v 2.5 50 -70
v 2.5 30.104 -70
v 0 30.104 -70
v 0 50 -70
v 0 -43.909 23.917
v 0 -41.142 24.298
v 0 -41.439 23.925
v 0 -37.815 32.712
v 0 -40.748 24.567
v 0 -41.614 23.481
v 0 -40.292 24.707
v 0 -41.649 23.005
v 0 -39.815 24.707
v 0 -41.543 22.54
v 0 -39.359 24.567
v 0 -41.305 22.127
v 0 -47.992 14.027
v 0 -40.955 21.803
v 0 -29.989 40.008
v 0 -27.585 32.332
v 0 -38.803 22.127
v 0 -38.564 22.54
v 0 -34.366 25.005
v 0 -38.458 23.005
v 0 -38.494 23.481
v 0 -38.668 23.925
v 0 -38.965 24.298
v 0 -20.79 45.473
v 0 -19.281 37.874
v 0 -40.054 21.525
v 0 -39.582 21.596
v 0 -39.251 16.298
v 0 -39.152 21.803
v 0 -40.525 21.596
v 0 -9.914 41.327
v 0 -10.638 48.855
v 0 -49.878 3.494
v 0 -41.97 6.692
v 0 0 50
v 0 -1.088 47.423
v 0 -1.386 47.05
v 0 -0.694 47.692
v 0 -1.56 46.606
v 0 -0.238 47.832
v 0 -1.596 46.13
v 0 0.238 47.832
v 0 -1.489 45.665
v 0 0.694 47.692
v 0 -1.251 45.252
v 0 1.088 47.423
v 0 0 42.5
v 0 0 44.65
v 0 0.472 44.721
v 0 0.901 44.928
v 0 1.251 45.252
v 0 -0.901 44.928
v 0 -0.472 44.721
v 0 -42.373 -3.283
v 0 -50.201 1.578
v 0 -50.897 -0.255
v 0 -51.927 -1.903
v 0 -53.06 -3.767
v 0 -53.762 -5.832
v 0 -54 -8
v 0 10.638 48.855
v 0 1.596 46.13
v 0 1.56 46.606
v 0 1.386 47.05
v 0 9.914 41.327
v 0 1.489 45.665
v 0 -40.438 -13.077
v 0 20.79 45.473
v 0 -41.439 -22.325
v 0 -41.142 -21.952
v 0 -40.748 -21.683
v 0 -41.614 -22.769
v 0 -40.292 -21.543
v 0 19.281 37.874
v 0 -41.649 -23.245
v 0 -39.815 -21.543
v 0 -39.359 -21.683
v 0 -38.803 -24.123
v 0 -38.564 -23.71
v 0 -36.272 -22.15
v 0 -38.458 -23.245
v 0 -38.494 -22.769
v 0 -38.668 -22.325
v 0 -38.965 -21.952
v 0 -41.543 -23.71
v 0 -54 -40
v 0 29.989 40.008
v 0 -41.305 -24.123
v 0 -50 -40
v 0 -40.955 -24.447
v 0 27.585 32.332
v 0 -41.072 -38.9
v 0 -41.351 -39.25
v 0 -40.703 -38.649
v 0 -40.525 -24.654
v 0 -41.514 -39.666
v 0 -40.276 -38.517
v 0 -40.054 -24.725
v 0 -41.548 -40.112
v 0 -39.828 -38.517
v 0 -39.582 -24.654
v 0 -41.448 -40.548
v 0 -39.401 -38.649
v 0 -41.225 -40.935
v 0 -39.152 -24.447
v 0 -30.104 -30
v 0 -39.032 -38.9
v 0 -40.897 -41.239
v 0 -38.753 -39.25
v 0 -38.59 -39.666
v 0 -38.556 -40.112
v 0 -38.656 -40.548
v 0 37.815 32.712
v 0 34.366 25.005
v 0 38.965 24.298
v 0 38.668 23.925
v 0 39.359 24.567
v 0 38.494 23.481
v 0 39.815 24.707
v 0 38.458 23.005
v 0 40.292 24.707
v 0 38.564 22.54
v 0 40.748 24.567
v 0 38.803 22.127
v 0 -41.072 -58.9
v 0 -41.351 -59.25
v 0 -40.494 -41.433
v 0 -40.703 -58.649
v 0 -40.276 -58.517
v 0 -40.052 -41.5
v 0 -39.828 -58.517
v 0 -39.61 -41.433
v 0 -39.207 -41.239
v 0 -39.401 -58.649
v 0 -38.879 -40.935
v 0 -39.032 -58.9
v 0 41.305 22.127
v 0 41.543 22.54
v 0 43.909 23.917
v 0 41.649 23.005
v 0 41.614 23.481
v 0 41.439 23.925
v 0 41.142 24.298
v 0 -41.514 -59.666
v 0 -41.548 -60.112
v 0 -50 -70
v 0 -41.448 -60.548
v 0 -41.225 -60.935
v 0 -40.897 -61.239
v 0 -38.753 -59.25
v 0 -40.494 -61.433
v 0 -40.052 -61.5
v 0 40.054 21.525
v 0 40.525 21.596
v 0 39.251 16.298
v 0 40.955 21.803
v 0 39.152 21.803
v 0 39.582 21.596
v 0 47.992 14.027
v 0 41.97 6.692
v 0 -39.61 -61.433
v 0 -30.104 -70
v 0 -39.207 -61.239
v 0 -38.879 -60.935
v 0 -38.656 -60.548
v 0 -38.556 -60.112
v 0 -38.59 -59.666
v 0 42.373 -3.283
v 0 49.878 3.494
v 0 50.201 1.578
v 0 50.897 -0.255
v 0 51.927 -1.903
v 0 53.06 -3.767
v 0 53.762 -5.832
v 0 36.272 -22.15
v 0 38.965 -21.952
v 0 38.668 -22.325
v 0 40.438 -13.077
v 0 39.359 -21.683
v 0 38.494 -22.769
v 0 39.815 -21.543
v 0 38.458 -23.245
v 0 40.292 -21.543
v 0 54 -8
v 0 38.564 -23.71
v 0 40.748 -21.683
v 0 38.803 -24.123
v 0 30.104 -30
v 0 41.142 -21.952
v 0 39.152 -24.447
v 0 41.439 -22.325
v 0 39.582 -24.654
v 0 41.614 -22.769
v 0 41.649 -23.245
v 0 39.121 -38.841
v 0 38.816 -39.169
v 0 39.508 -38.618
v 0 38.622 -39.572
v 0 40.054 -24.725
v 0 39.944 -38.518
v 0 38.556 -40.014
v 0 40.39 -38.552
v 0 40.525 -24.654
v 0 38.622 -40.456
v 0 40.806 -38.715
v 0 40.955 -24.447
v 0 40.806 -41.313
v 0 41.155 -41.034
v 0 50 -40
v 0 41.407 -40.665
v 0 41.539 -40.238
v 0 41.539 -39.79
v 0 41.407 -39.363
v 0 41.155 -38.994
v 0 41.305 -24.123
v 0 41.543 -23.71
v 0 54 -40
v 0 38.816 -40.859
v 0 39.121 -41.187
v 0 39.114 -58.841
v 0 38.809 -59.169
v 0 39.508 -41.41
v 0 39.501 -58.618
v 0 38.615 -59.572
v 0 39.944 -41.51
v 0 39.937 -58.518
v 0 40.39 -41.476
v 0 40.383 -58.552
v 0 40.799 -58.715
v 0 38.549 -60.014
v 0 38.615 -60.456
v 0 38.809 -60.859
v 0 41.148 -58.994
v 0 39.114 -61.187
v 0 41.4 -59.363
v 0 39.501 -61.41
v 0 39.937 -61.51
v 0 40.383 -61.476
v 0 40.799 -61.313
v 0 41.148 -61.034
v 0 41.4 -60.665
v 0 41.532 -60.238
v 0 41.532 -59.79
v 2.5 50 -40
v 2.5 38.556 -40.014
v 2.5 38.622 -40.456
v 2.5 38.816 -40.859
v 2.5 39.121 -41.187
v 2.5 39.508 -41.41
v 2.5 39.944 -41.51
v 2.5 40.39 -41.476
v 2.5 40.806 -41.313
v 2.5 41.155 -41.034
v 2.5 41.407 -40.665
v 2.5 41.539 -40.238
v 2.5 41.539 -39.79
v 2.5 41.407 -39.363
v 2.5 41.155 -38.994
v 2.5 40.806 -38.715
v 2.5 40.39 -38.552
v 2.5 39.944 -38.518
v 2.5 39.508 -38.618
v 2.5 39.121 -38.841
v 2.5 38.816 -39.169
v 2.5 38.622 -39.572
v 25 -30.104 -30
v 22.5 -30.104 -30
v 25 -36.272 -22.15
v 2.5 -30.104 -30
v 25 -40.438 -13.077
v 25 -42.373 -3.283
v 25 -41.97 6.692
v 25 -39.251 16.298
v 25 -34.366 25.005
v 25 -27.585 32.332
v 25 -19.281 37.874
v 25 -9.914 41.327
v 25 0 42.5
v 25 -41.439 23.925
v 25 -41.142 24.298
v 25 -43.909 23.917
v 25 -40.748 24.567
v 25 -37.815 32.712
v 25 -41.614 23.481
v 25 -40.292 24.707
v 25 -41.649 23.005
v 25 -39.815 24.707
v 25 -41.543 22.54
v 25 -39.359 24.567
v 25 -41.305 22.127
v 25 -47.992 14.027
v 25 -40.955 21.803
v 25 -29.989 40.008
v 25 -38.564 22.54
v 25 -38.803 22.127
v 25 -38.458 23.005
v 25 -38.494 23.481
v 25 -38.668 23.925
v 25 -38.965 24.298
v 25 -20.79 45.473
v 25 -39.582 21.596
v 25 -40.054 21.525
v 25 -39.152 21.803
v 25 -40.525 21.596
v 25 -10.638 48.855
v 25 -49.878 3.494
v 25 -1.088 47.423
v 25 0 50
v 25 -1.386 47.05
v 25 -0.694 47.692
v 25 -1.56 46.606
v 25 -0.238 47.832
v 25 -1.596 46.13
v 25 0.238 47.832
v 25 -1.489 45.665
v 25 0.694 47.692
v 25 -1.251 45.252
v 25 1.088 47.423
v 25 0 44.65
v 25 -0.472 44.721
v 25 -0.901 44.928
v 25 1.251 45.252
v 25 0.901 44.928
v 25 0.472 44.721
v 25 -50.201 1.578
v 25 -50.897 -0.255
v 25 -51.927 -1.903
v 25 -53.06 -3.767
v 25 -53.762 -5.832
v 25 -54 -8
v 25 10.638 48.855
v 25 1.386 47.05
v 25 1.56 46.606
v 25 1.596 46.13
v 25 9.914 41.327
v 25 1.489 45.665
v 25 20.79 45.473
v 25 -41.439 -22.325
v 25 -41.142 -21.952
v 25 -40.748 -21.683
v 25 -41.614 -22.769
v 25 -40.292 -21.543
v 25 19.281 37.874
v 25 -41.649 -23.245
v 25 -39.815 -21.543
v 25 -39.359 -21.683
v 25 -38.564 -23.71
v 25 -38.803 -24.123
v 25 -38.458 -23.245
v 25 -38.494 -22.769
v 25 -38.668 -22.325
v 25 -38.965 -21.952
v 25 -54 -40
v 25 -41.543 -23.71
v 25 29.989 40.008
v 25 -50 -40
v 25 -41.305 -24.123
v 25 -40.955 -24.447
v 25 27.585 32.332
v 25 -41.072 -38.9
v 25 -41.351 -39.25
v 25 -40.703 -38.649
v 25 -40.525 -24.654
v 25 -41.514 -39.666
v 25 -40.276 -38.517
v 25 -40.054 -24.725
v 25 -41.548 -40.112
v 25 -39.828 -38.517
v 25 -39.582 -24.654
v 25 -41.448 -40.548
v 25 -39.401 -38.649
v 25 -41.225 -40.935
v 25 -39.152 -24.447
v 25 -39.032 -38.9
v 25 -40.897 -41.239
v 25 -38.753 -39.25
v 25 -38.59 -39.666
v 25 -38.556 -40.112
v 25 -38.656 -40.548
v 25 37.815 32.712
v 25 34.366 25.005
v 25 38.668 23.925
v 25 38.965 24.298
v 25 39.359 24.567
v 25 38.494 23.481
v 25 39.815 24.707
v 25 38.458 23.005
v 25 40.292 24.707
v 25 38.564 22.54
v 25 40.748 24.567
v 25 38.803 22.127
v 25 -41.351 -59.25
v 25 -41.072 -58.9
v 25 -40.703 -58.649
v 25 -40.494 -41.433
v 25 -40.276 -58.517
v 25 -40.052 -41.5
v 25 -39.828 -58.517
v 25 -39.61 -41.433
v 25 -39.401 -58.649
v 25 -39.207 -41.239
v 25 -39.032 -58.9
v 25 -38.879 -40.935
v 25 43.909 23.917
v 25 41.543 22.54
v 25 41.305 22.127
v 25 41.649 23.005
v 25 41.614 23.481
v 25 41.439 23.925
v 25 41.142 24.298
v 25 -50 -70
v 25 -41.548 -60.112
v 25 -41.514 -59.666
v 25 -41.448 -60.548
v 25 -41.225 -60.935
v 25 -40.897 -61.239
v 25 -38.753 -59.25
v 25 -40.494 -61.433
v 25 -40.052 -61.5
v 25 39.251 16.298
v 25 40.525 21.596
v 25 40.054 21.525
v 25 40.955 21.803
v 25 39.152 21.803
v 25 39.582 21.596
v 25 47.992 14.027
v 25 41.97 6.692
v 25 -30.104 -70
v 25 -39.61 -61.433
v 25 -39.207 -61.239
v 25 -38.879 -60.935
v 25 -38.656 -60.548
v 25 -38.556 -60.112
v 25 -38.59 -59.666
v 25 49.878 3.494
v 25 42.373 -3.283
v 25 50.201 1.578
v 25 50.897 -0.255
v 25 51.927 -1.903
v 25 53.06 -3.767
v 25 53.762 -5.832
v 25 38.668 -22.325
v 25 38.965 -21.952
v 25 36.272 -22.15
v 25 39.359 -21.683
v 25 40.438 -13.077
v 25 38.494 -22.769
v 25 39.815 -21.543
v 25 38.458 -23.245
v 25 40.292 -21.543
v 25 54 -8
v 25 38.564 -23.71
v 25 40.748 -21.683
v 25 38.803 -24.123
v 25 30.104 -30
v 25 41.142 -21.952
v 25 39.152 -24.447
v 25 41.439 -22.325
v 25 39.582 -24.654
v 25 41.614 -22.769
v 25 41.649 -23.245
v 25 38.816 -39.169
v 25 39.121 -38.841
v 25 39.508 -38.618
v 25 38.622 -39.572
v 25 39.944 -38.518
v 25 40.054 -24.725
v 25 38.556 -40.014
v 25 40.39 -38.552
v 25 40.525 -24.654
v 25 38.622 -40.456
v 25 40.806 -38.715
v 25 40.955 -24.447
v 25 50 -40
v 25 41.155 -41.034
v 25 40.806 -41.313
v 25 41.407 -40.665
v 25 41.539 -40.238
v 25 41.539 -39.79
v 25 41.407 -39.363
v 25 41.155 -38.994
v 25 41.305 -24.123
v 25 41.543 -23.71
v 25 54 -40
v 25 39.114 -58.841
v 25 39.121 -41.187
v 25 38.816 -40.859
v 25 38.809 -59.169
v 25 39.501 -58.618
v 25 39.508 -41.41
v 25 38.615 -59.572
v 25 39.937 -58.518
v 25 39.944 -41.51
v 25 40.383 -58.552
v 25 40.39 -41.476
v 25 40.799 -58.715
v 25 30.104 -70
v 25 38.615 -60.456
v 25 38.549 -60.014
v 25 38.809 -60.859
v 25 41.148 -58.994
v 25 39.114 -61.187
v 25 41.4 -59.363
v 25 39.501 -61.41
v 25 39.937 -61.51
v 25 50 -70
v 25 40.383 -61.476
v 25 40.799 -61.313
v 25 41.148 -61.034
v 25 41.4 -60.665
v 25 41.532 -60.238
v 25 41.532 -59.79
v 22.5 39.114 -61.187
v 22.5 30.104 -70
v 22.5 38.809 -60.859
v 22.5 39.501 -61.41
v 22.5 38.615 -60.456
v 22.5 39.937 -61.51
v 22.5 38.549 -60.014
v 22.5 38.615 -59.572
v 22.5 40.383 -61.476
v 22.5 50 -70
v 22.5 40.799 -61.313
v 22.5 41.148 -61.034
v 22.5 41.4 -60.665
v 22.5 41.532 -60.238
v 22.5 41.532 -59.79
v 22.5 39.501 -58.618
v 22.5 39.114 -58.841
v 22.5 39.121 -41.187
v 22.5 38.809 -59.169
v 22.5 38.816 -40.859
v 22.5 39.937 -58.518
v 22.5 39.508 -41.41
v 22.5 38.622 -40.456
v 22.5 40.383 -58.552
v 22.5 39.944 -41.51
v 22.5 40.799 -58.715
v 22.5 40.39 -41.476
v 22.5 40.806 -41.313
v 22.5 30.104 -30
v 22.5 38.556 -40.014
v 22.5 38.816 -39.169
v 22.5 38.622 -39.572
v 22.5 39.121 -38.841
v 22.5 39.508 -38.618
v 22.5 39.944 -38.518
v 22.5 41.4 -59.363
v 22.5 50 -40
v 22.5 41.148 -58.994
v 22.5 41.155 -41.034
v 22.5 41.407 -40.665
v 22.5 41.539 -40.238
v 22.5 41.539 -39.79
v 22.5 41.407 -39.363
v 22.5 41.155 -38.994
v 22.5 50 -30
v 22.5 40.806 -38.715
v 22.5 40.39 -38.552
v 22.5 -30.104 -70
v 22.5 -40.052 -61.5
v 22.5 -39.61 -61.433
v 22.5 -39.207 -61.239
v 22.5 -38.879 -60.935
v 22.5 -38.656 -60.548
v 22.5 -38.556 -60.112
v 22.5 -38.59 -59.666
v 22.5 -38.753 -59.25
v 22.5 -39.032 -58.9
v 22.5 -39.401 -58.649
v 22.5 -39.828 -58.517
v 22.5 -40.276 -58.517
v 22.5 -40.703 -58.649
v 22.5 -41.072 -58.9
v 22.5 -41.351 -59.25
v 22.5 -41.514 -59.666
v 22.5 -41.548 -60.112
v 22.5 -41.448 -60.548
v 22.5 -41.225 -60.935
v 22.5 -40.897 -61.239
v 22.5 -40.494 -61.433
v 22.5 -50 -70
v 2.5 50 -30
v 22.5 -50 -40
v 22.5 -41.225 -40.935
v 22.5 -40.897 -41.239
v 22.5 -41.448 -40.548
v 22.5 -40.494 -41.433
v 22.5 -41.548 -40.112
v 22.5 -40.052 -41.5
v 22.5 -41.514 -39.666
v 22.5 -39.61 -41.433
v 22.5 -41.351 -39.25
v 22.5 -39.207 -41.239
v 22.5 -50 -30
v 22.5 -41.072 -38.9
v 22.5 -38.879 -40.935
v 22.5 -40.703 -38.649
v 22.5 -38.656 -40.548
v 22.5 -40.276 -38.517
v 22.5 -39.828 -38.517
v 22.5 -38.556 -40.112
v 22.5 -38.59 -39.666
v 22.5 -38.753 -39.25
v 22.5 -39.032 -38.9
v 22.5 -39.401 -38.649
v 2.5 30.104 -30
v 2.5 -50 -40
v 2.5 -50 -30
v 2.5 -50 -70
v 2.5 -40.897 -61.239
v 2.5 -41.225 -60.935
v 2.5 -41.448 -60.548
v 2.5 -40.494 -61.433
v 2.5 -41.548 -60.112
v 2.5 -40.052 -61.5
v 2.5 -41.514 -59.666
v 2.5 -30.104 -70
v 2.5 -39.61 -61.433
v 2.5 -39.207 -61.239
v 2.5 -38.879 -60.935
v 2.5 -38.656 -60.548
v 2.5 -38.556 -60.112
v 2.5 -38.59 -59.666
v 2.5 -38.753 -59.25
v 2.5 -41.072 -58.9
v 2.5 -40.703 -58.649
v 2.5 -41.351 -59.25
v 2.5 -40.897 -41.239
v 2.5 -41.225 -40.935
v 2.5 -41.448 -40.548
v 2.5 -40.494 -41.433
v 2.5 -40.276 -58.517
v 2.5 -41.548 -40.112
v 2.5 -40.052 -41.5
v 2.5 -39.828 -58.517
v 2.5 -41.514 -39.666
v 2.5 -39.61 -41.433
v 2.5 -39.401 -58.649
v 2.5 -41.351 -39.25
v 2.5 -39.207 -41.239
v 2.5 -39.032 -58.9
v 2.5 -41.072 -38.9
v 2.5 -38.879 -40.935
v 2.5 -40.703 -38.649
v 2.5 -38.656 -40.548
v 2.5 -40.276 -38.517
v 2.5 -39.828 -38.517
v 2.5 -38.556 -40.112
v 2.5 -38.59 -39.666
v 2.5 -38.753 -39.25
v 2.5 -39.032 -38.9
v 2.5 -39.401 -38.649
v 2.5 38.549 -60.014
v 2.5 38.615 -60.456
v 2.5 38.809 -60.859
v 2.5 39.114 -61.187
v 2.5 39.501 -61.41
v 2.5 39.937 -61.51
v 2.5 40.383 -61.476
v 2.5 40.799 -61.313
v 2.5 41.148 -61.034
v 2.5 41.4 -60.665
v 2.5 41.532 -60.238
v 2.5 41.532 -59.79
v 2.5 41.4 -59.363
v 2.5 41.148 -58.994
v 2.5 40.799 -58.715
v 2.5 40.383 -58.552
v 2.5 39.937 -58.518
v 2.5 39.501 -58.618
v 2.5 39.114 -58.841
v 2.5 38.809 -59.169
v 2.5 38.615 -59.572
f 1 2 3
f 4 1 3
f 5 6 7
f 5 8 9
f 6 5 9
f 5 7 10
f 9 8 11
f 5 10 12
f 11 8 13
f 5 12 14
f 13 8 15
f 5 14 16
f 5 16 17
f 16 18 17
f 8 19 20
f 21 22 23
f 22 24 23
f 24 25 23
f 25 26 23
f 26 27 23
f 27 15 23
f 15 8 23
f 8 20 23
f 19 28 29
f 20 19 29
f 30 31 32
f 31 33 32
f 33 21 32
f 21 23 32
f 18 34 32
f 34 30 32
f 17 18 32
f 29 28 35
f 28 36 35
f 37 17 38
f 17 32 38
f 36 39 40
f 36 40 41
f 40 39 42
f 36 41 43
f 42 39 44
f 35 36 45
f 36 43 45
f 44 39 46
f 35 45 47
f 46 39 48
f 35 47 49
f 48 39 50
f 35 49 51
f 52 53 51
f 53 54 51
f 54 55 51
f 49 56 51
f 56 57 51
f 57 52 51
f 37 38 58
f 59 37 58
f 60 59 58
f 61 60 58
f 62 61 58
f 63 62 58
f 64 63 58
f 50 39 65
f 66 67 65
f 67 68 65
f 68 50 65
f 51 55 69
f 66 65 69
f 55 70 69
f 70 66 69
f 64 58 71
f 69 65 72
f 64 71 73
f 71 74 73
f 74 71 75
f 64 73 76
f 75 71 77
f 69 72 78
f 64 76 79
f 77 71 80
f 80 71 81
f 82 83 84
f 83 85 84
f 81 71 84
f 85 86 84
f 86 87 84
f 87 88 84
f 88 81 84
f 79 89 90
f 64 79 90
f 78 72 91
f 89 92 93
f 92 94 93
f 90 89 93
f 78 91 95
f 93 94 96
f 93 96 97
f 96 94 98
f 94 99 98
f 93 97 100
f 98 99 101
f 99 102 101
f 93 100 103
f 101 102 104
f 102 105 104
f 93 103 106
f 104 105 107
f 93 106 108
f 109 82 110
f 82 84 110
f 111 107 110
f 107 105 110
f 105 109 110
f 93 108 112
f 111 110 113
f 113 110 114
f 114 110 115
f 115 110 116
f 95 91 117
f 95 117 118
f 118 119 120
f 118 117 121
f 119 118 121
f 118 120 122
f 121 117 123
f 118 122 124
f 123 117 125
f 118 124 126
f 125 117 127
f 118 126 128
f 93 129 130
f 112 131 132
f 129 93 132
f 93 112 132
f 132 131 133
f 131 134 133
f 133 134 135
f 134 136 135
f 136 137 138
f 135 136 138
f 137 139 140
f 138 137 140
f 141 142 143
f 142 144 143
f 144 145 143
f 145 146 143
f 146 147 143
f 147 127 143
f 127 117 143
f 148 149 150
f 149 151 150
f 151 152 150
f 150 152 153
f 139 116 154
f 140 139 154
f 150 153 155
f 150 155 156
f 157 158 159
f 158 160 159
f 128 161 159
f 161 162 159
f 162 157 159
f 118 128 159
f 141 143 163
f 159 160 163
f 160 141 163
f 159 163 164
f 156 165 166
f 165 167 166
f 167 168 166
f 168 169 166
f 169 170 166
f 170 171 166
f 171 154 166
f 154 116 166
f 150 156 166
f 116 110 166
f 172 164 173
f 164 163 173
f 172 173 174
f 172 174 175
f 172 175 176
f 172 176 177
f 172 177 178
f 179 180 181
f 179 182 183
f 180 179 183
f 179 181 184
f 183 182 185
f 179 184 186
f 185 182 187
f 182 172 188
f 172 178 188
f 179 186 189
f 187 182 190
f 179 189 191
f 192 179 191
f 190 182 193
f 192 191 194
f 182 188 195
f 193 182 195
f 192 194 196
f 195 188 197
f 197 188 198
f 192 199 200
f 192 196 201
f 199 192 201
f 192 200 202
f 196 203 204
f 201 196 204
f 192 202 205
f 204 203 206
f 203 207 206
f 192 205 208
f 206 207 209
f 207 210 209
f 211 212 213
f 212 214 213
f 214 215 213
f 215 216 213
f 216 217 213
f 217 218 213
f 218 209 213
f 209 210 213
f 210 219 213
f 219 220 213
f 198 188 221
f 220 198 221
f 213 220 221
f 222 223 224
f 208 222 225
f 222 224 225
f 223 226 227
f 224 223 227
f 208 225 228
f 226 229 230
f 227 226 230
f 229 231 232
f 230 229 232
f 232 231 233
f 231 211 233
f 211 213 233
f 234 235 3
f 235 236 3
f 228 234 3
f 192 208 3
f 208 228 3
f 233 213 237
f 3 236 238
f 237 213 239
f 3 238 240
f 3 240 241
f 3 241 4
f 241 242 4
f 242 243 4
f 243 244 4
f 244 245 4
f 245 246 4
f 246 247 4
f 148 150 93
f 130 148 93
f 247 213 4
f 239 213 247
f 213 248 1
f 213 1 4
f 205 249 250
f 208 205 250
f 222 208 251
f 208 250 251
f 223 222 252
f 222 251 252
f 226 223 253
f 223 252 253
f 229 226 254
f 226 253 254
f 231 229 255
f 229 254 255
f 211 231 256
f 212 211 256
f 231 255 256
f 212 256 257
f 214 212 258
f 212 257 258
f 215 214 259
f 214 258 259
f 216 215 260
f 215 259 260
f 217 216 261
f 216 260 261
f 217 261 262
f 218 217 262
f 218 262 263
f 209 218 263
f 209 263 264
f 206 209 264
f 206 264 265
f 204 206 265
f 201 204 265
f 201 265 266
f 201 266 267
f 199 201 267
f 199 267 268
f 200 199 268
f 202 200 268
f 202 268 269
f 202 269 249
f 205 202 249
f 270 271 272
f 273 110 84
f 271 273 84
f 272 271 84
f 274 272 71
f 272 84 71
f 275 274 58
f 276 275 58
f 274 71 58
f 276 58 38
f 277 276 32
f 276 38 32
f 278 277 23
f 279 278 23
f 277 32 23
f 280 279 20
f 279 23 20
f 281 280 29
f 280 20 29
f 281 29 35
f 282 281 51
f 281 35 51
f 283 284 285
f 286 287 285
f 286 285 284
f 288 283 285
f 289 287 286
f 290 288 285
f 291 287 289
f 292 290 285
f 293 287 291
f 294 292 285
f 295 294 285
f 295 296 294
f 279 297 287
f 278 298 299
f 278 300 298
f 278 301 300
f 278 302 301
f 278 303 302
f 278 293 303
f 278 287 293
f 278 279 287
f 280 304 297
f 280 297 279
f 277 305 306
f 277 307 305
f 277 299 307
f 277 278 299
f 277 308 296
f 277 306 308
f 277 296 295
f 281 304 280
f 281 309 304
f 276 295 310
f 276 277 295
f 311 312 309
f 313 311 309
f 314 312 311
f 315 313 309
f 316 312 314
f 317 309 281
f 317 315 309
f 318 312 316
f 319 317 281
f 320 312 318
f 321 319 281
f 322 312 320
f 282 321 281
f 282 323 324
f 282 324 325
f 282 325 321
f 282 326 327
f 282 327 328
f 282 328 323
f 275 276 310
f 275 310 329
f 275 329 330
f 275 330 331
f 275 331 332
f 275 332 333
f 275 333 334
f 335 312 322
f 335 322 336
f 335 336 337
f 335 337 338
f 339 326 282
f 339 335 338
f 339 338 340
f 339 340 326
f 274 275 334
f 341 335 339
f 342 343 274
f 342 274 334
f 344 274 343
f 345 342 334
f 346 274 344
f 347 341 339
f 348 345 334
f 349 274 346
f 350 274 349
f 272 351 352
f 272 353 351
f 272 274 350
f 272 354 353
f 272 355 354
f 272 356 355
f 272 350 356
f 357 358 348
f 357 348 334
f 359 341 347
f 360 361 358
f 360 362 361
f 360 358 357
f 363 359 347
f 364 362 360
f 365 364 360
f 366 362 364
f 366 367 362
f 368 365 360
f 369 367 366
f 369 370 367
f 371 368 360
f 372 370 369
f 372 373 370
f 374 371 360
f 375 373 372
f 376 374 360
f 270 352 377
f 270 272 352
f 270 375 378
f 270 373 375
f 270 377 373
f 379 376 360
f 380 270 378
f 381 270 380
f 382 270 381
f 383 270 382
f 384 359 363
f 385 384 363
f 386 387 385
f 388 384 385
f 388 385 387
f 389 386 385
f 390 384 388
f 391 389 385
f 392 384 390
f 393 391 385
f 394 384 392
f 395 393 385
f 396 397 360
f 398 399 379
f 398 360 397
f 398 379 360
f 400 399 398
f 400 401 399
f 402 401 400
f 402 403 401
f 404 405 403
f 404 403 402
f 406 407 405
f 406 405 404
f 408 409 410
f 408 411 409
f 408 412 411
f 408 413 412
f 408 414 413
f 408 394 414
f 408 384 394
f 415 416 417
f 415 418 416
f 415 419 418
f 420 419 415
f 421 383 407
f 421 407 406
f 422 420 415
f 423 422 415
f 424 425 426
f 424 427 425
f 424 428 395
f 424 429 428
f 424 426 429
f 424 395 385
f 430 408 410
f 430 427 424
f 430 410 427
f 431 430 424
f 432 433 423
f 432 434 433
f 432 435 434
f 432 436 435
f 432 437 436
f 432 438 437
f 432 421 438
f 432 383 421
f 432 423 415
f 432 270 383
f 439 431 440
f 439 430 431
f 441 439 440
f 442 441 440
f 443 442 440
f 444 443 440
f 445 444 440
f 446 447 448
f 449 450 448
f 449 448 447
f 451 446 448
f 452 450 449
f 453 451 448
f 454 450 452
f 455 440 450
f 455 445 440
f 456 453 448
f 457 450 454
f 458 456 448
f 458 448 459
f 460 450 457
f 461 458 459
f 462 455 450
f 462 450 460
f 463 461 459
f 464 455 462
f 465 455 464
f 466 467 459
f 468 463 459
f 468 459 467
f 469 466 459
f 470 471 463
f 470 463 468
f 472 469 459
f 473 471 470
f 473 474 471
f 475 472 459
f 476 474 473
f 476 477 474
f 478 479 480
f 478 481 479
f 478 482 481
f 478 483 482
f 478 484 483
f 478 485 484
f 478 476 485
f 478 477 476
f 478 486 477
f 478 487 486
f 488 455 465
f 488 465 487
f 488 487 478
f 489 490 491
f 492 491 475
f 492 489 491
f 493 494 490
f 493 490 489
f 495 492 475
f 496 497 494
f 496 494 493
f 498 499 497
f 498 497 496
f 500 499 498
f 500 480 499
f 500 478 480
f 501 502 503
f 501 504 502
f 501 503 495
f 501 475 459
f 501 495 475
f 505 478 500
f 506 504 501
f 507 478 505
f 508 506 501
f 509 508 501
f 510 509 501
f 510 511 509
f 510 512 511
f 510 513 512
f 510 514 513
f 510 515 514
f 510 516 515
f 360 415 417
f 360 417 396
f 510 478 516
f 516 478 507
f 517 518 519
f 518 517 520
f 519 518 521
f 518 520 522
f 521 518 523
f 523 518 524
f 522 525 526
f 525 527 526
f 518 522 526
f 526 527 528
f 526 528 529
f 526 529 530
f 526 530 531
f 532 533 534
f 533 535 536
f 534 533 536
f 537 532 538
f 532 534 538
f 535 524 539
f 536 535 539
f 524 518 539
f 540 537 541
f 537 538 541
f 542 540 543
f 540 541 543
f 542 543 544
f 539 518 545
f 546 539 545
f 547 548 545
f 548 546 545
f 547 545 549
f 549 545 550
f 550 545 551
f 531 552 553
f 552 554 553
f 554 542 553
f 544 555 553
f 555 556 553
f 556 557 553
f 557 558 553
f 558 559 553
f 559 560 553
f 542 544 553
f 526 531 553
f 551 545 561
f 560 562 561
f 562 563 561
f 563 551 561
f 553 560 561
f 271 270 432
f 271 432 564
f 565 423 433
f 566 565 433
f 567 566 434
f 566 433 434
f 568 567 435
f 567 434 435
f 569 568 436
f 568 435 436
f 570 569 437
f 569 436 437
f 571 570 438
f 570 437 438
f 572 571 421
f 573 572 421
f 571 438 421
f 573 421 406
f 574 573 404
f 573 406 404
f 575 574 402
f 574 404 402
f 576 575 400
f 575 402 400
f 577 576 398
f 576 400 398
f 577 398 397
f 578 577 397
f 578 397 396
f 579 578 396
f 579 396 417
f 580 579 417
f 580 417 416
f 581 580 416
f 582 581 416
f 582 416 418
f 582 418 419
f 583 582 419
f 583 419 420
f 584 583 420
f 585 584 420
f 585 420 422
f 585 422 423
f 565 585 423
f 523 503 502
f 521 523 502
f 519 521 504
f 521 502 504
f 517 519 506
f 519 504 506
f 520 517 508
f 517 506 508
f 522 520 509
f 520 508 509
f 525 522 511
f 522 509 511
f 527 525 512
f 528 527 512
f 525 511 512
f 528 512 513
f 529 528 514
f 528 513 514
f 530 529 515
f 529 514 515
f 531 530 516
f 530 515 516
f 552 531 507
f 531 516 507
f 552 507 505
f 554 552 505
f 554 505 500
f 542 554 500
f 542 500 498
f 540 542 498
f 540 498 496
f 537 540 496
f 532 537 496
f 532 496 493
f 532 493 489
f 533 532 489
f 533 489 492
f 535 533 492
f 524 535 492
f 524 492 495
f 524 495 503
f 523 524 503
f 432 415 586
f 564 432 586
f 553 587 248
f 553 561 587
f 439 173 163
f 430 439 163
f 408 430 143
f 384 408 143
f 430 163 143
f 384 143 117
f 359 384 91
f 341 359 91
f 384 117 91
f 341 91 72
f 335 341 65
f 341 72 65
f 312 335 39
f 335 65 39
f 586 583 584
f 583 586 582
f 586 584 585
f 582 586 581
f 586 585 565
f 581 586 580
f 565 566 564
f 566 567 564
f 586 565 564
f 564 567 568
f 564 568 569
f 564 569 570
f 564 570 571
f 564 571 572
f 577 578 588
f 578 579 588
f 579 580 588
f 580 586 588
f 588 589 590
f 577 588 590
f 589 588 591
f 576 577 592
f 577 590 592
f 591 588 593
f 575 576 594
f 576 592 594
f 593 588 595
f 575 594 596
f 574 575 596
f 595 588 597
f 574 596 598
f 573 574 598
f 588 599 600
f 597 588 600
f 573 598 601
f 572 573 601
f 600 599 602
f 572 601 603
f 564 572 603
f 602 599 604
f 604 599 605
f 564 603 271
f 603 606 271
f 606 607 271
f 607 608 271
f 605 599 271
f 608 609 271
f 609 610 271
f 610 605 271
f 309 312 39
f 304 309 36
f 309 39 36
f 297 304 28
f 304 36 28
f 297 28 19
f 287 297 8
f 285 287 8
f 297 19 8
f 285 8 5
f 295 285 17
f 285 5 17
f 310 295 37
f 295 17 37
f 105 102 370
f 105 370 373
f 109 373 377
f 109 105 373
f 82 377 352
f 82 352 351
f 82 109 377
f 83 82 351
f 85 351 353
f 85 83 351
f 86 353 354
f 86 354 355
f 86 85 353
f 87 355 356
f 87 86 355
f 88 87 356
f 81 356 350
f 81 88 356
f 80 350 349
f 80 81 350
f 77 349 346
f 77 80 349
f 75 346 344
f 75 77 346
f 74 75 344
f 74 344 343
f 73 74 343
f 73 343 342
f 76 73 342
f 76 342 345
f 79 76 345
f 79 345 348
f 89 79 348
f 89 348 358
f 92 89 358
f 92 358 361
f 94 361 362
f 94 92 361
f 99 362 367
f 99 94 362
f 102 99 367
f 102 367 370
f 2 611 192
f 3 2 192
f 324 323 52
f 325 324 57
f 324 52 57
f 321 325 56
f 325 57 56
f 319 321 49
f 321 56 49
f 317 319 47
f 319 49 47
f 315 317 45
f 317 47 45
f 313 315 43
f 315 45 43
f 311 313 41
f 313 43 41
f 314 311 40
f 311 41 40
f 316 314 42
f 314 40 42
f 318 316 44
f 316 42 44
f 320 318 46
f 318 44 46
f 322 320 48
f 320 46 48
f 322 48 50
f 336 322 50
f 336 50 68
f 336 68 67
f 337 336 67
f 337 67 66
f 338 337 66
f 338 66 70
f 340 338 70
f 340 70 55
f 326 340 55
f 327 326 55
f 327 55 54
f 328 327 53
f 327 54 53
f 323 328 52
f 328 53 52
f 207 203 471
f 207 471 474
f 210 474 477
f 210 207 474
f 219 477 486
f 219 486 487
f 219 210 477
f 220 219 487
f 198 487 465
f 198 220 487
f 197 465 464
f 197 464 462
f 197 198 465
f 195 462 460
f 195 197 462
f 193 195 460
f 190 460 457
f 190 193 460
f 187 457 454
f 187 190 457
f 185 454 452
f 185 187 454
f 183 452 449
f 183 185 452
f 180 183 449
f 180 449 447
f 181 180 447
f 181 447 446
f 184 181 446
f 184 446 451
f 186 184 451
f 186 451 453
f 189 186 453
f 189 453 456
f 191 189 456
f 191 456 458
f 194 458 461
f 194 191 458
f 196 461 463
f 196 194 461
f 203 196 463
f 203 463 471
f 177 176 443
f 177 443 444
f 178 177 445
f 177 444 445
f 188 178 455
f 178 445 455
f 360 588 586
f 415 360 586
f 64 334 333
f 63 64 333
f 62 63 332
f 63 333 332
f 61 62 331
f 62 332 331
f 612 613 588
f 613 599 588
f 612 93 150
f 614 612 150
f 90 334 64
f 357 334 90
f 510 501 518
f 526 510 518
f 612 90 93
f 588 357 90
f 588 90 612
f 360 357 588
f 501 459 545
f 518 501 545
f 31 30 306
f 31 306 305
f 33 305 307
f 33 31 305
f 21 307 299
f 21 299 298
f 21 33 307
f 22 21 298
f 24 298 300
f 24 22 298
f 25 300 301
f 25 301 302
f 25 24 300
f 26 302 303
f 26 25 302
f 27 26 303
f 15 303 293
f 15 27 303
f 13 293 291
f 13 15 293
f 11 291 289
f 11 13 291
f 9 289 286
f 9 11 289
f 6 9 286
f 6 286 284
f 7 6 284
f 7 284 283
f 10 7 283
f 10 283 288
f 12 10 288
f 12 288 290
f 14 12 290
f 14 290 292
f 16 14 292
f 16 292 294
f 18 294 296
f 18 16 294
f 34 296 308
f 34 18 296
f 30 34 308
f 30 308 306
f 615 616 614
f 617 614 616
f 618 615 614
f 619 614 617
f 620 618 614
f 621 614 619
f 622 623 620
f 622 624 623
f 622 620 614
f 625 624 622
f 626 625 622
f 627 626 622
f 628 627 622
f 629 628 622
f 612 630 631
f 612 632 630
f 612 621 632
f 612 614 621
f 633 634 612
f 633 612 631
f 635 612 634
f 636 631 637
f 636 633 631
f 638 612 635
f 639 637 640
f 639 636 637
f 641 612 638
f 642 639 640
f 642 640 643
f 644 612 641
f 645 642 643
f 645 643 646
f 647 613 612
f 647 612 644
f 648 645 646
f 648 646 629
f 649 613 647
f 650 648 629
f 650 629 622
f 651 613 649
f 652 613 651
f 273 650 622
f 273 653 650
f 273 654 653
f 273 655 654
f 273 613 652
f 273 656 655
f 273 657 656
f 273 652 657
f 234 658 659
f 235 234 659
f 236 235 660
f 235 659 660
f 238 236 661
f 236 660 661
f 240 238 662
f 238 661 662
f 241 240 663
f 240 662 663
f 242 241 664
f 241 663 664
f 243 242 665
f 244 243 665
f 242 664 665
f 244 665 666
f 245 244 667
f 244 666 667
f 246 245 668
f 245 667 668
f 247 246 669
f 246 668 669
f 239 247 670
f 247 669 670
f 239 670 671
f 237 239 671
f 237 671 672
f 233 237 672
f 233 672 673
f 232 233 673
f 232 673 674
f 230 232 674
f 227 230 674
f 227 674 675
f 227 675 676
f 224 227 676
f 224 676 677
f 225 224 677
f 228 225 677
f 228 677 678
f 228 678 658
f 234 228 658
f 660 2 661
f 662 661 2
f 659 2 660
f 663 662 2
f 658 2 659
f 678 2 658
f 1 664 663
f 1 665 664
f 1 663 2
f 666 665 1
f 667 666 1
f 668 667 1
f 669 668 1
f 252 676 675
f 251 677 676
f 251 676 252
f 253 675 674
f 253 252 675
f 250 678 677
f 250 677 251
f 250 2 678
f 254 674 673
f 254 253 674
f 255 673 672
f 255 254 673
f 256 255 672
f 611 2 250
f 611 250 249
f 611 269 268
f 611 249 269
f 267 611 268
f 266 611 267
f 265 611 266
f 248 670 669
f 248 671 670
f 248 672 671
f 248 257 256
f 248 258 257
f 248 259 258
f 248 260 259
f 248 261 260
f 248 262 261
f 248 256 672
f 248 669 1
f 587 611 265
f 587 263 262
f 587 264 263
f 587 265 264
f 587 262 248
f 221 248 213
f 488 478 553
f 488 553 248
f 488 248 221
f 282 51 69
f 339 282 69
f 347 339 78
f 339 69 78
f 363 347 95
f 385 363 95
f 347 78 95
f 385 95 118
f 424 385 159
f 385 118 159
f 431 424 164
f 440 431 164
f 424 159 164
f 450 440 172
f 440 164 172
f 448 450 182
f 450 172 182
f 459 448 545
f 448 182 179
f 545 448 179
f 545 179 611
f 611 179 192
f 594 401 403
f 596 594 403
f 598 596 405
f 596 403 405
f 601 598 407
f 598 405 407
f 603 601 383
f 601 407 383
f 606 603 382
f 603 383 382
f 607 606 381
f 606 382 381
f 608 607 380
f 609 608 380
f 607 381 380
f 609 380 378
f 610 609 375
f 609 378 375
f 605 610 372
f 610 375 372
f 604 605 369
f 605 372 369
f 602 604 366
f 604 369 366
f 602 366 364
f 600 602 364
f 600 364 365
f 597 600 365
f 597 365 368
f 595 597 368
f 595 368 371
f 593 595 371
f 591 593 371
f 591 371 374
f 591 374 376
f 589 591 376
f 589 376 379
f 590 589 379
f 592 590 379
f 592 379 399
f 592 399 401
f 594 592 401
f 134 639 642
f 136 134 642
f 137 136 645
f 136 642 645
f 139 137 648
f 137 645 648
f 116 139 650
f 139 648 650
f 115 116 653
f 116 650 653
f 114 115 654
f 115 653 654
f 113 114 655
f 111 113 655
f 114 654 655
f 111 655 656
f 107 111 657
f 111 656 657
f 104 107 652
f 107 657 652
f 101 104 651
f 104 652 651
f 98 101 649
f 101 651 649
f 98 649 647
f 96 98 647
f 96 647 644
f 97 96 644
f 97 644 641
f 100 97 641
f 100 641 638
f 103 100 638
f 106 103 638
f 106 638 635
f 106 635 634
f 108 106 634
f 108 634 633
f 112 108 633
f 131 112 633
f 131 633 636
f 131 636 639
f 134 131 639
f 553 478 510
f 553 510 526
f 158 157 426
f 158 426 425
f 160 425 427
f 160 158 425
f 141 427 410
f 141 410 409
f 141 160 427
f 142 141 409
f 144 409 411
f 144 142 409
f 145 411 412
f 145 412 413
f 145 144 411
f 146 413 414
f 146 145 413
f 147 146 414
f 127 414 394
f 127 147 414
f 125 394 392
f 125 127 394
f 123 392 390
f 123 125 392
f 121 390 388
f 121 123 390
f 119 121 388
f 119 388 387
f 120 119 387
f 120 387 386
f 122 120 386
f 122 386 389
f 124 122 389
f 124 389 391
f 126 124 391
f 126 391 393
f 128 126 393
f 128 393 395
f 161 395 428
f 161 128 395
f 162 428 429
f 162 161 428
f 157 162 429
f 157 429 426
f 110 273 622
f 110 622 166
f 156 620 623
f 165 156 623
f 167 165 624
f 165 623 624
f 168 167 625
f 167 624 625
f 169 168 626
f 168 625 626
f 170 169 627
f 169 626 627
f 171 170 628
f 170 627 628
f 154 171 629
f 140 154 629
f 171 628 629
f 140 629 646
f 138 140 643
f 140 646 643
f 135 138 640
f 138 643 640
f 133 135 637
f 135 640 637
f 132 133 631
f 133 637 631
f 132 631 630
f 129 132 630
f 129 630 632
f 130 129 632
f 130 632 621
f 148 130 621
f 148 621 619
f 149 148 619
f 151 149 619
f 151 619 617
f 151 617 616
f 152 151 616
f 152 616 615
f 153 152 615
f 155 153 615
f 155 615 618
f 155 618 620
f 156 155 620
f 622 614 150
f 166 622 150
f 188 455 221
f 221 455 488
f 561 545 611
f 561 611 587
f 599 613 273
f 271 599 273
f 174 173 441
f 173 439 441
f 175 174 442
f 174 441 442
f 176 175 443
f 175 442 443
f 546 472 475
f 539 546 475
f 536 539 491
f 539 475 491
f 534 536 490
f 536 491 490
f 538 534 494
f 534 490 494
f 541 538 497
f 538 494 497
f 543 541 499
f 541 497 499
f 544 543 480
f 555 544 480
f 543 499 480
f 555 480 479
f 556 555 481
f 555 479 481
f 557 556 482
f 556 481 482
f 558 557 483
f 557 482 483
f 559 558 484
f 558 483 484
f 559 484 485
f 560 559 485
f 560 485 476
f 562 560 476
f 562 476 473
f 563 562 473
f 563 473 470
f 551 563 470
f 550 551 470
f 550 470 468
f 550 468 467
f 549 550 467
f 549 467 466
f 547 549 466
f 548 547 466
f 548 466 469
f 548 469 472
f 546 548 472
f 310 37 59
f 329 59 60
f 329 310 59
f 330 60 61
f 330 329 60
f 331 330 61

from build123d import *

# Parameters (mm, degrees)
SKETCH_1_R          = 1.6
EXTRUDE_1_DEPTH     = 25
SKETCH_2_W          = 2.5
SKETCH_2_H          = 19.896013553
EXTRUDE_2_DEPTH     = 40
SKETCH_3_R          = 1.5
CUT_EXTRUDE_1_DEPTH = 90.582364336
SKETCH_4_W          = 40
SKETCH_4_H          = 4
EXTRUDE_3_DEPTH     = 25
FILLET_4_R          = 10
FILLET_5_R          = 10


with BuildPart() as part:
    # 草图1 → 凸台-拉伸1 (new body)
    # profile 1 of 2: a face of its own
    with BuildSketch(Plane(origin=(0, 0, 0), x_dir=(0, 0, -1), z_dir=(1, 0, 0))):
        with BuildLine():
            ThreePointArc((-47.85, 0), (-46.25, 1.6), (-44.65, 0))
            Line((-44.65, 0), (-42.5, 0))
            ThreePointArc((-42.5, 0), (-16.298006013, 39.25079617), (30, 30.103986447))
            Line((30, 30.103986447), (30, 50))
            Line((30, 50), (0, 50))
            ThreePointArc((0, 50), (-35.355339059, 35.355339059), (-50, 0))
            Line((-50, 0), (-47.85, 0))
        make_face()
        with Locations((-23.125, 40.053674925)):
            Circle(SKETCH_1_R, mode=Mode.SUBTRACT)
        with Locations((23.125, 40.053674925)):
            Circle(SKETCH_1_R, mode=Mode.SUBTRACT)
    # profile 2 of 2: a face of its own
    with BuildSketch(Plane(origin=(0, 0, 0), x_dir=(0, 0, -1), z_dir=(1, 0, 0))):
        with BuildLine():
            Line((-42.5, 0), (-44.65, 0))
            ThreePointArc((-44.65, 0), (-46.25, -1.6), (-47.85, 0))
            Line((-47.85, 0), (-50, 0))
            ThreePointArc((-50, 0), (-35.355339059, -35.355339059), (0, -50))
            Line((0, -50), (30, -50))
            Line((30, -50), (30, -30.103986447))
            ThreePointArc((30, -30.103986447), (-16.298006013, -39.25079617), (-42.5, 0))
        make_face()
        with Locations((-23.125, -40.053674925)):
            Circle(SKETCH_1_R, mode=Mode.SUBTRACT)
        with Locations((23.125, -40.053674925)):
            Circle(SKETCH_1_R, mode=Mode.SUBTRACT)
    extrude(amount=EXTRUDE_1_DEPTH)

    # 草图2 → 凸台-拉伸2 (add)
    with BuildSketch(Plane(origin=(0, 0, -30), x_dir=(-1, 0, 0), z_dir=(0, 0, -1))):
        with Locations((-23.75, 40.051993223)):
            Rectangle(SKETCH_2_W, SKETCH_2_H)
        with Locations((-1.25, 40.051993223)):
            Rectangle(SKETCH_2_W, SKETCH_2_H)
        with Locations((-1.25, -40.051993223)):
            Rectangle(SKETCH_2_W, SKETCH_2_H)
        with Locations((-23.75, -40.051993223)):
            Rectangle(SKETCH_2_W, SKETCH_2_H)
    extrude(amount=EXTRUDE_2_DEPTH)

    # 草图3 → 切除-拉伸1 (cut, through all)
    with BuildSketch(Plane(origin=(25, 0, 0), x_dir=(0, 0, -1), z_dir=(1, 0, 0))):
        with Locations((60, -40.051993223)):
            Circle(SKETCH_3_R)
        with Locations((40, -40.051993223)):
            Circle(SKETCH_3_R)
        with Locations(Location((40.013969678, 40.055824633, 0), (0, 0, 270))):
            Circle(SKETCH_3_R)
        with Locations(Location((60.013968461, 40.048849195, 0), (0, 0, 270))):
            Circle(SKETCH_3_R)
    extrude(amount=-CUT_EXTRUDE_1_DEPTH, mode=Mode.SUBTRACT)

    # 草图4 → 凸台-拉伸3 (add)
    with BuildSketch(Plane(origin=(25, 0, 0), x_dir=(0, 0, -1), z_dir=(1, 0, 0))):
        with Locations((20, 52)):
            Rectangle(SKETCH_4_W, SKETCH_4_H)
        with Locations((20, -52)):
            Rectangle(SKETCH_4_W, SKETCH_4_H)
    extrude(amount=-EXTRUDE_3_DEPTH)

    # 圆角4
    # the kernel refuses this fillet: 10 mm, written as the material it takes off along each edge
    with BuildSketch(Plane(origin=(45, -54, 0), x_dir=(0, 0, -1), z_dir=(-1, 0, 0))) as fillet_4_piece_1:
        with BuildLine():
            CenterArc((8, -10), FILLET_4_R, 90, 53.130102354)
            Line((0, -4), (-0.16, -3.88))
            ThreePointArc((-0.16, -3.88), (-0.2, -2), (-0.2, 0))
            Line((-0.2, 0), (0, 0.2))
            Line((0, 0.2), (8, 0.2))
            Line((8, 0.2), (8, 0))
        make_face()
    extrude(amount=65, mode=Mode.SUBTRACT)
    with BuildSketch(Plane(origin=(45, 54, 0), x_dir=(0, 0, -1), z_dir=(-1, 0, 0))) as fillet_4_piece_2:
        with BuildLine():
            CenterArc((8, 10), FILLET_4_R, 216.869897646, 53.130102354)
            Line((0, 4), (-0.16, 3.88))
            ThreePointArc((-0.16, 3.88), (-0.2, 2), (-0.2, 0))
            Line((-0.2, 0), (0, -0.2))
            Line((0, -0.2), (8, -0.2))
            Line((8, -0.2), (8, 0))
        make_face()
    extrude(amount=65, mode=Mode.SUBTRACT)

    # 圆角5
    fillet_5_edges = [part.edges().sort_by_distance(p)[0] for p in [
        (12.5, -50, 0),
        (12.5, 50, 0),
    ]]
    fillet(fillet_5_edges, radius=FILLET_5_R)


solid = part.part
